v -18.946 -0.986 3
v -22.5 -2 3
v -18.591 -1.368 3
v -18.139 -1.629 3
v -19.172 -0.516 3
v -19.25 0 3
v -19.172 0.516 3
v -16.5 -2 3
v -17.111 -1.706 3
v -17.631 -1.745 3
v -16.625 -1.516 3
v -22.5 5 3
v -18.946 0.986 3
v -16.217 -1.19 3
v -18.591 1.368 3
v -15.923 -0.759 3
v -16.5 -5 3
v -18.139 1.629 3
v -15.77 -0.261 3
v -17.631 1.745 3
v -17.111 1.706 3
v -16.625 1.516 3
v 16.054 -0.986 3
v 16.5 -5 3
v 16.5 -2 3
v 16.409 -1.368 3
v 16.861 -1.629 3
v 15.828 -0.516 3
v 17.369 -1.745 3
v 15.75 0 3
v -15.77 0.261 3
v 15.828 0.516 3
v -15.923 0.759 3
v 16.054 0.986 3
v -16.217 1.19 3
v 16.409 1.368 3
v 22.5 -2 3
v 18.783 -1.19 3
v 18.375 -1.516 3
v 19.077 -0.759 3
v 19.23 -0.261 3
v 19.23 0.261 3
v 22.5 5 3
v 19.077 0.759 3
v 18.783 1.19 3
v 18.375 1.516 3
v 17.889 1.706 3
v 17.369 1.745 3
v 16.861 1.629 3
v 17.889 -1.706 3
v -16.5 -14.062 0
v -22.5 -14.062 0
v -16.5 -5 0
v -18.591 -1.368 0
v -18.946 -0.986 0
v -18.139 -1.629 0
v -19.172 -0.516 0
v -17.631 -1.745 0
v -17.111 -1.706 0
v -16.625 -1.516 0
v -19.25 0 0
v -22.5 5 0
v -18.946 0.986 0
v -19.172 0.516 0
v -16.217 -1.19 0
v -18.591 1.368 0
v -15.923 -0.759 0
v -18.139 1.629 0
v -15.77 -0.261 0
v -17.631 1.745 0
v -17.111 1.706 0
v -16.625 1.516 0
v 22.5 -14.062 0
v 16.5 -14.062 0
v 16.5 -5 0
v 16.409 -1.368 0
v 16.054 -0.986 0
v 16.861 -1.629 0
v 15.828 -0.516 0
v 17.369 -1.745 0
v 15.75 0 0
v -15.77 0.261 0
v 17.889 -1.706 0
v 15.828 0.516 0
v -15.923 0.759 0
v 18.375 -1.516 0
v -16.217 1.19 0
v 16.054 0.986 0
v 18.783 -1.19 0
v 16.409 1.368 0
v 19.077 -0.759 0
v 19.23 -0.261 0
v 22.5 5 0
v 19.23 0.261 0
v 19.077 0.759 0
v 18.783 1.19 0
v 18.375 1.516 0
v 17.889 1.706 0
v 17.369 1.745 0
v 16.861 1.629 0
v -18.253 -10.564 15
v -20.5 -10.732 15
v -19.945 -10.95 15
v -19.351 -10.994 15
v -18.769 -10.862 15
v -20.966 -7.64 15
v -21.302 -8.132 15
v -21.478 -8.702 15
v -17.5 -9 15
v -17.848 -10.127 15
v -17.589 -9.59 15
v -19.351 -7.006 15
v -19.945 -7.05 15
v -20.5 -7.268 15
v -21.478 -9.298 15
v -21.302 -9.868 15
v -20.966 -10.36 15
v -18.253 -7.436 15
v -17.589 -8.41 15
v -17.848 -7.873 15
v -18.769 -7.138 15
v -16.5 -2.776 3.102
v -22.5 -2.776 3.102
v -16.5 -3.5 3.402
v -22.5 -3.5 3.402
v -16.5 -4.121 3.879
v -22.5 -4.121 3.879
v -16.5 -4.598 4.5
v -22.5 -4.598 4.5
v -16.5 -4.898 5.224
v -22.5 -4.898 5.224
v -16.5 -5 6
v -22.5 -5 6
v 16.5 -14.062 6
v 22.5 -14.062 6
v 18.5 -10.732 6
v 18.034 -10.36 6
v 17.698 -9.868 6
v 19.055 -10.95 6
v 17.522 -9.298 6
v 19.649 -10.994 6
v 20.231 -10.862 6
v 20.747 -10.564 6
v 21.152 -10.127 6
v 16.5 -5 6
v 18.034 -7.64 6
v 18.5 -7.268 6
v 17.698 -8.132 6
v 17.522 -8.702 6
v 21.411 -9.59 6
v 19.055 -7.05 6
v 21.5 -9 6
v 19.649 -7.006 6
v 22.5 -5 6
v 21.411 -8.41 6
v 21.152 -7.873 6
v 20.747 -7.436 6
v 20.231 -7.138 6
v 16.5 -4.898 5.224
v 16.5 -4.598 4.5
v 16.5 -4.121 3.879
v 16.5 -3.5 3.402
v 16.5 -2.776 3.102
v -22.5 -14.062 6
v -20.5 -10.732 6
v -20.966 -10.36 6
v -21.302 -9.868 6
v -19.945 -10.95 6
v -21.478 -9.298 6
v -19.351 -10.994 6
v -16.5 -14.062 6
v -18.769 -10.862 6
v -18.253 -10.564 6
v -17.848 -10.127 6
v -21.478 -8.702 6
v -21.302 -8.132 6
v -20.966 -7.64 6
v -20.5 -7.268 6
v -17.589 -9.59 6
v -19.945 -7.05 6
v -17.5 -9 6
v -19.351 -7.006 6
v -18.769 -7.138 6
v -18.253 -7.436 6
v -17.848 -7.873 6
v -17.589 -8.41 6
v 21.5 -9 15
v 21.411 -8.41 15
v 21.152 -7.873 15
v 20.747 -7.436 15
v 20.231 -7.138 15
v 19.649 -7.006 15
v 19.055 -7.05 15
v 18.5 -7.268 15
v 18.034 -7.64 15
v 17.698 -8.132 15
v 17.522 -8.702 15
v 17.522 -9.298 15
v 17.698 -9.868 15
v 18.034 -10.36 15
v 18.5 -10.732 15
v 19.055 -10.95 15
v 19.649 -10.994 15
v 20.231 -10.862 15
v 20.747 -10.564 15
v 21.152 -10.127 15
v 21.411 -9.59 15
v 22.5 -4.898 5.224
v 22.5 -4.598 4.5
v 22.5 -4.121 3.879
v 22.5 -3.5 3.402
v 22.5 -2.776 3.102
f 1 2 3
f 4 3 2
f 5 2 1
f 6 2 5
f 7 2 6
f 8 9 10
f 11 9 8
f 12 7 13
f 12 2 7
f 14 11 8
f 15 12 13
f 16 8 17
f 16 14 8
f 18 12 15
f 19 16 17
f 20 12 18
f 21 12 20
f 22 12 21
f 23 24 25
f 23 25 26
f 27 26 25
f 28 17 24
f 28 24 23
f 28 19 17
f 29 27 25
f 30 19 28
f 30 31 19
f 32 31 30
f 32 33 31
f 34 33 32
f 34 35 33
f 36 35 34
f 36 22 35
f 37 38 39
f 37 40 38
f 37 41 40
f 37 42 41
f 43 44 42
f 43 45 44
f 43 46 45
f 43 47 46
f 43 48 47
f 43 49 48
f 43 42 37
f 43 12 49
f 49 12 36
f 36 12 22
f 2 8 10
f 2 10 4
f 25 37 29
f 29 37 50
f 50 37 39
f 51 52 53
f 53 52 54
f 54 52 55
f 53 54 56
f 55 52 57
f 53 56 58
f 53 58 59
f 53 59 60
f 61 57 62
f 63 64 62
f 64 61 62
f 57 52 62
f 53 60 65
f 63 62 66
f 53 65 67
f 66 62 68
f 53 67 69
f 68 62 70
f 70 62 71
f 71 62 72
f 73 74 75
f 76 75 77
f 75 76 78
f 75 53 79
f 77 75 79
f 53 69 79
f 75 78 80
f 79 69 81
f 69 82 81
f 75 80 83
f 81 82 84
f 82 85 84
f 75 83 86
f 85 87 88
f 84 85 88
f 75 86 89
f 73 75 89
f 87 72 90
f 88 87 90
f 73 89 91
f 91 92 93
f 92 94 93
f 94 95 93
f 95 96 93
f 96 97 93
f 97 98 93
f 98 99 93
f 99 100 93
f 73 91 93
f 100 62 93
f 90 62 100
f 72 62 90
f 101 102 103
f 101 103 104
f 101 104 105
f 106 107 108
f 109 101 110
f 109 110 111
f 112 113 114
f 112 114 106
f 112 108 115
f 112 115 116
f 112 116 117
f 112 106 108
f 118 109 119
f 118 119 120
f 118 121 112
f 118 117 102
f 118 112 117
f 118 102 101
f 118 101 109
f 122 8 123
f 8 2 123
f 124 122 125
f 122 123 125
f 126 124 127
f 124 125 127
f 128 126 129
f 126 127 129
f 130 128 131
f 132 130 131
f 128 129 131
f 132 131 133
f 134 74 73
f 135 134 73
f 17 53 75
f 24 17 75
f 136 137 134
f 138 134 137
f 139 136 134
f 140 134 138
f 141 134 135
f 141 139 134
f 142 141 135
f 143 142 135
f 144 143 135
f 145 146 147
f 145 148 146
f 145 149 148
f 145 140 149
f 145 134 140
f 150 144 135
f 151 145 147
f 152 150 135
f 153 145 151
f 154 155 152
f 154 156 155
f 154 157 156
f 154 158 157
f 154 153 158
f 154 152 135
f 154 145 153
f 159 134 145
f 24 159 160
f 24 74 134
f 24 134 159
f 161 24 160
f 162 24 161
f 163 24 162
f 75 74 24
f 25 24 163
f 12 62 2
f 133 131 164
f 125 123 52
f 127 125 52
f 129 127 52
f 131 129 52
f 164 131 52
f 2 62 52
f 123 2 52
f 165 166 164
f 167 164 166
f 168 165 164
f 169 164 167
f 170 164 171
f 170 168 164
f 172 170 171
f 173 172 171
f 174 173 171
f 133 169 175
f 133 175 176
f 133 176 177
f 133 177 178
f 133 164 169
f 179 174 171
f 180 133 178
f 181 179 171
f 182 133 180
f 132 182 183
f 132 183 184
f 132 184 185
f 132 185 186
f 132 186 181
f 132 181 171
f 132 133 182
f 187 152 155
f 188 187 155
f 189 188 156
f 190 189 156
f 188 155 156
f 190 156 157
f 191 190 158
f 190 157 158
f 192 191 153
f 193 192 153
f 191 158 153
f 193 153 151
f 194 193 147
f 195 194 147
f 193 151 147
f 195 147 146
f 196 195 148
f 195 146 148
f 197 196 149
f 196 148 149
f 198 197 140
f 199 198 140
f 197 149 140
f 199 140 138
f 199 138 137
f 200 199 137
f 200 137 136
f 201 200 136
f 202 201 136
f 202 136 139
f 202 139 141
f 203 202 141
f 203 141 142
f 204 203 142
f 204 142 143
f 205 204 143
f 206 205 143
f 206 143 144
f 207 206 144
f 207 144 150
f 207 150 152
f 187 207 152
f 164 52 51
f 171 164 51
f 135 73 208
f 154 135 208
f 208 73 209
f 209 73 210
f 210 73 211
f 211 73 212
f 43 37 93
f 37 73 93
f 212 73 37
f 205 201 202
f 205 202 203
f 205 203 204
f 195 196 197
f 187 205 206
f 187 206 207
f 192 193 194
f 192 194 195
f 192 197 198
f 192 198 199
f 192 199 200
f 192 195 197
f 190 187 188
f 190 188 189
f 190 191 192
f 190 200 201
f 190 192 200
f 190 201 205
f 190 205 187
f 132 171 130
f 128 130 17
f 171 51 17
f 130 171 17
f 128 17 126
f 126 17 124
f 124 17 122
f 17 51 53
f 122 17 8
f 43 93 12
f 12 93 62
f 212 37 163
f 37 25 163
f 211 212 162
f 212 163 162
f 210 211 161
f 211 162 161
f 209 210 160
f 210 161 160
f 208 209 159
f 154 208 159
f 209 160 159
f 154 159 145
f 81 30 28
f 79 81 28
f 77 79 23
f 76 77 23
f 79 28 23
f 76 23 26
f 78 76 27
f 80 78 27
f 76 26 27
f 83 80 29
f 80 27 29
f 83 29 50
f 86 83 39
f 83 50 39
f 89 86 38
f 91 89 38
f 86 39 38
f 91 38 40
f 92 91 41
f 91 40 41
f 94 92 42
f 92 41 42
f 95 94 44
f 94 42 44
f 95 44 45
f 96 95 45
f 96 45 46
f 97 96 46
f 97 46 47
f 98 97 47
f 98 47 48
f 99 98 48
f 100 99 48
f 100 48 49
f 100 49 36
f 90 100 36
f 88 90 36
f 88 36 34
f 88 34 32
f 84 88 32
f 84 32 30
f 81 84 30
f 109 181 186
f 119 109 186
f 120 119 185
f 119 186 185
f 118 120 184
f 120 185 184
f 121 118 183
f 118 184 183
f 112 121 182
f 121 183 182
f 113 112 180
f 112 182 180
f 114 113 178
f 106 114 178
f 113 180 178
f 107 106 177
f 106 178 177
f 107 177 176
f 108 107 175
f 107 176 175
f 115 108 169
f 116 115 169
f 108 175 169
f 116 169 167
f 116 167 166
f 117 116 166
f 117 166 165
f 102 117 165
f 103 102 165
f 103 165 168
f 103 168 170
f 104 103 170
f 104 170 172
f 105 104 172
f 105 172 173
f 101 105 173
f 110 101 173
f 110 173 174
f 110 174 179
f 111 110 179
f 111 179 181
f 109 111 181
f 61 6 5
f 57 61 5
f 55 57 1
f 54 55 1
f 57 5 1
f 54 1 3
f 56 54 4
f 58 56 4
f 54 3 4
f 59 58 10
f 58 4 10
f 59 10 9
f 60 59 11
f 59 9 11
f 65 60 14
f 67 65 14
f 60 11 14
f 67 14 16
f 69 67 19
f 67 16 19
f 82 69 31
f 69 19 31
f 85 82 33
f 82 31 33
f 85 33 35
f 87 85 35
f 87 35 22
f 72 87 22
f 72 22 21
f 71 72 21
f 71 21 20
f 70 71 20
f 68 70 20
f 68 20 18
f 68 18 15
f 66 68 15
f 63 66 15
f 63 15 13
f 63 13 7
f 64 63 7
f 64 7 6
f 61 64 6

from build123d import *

# Parameters (mm, degrees)
F0_W     = 6
F0_H     = 9.0617471188
F0_R     = 2
F1_DEPTH = 3
F2_D     = 3.5
F3_DEPTH = 15
F4_DEPTH = 6
F5_R     = 2.99999


# Not quite as in the source:
# - a fillet or chamfer is up to 0.001 mm smaller than in the source, because OpenCascade refuses the exact size
# - a feature names something its author has since deleted; it is built from what else it names


with BuildPart() as f1:
    # F0 (on Top) → F1 (new body)
    with BuildSketch(Plane.XY):
        Polygon((22.5, 5), (-22.5, 5), (-22.5, -5), (-16.5, -5), (16.5, -5), (22.5, -5), align=None)
        with Locations((-19.5, -9.5308735594)):
            Rectangle(F0_W, F0_H)
        with Locations((-19.5, -9)):
            Circle(F0_R, mode=Mode.SUBTRACT)
        with Locations((19.5, -9.5308735594)):
            Rectangle(F0_W, F0_H)
        with Locations((19.5, -9)):
            Circle(F0_R, mode=Mode.SUBTRACT)
        with Locations((-19.5, -9)):
            Circle(F0_R)
        with Locations((19.5, -9)):
            Circle(F0_R)
    extrude(amount=F1_DEPTH)

    # F2 (through all)
    with Locations(Plane(origin=(0, 0, 0), x_dir=(1, 0, 0), z_dir=(0, 0, -1))):
        with Locations((-17.5, 0), (17.5, 0)):
            Hole(F2_D / 2)

    # F0 (on Top) → F3 (join)
    with BuildSketch(Plane.XY):
        with Locations((-19.5, -9)):
            Circle(F0_R)
        with Locations((19.5, -9)):
            Circle(F0_R)
    extrude(amount=F3_DEPTH)

    # F0 (on Top) → F4 (join)
    with BuildSketch(Plane.XY):
        with Locations((-19.5, -9.5308735594)):
            Rectangle(F0_W, F0_H)
        with Locations((-19.5, -9)):
            Circle(F0_R, mode=Mode.SUBTRACT)
        with Locations((19.5, -9.5308735594)):
            Rectangle(F0_W, F0_H)
        with Locations((19.5, -9)):
            Circle(F0_R, mode=Mode.SUBTRACT)
        with Locations((-19.5, -9)):
            Circle(F0_R)
    extrude(amount=F4_DEPTH)

    # F5 (radius 3 in the source; OpenCascade refuses exactly that, so slightly less here)
    f5_edges = [f1.edges().sort_by_distance(p)[0] for p in [
        (-19.5, -5, 3),
        (19.5, -5, 3),
    ]]
    fillet(f5_edges, radius=F5_R)


solid = f1.part
